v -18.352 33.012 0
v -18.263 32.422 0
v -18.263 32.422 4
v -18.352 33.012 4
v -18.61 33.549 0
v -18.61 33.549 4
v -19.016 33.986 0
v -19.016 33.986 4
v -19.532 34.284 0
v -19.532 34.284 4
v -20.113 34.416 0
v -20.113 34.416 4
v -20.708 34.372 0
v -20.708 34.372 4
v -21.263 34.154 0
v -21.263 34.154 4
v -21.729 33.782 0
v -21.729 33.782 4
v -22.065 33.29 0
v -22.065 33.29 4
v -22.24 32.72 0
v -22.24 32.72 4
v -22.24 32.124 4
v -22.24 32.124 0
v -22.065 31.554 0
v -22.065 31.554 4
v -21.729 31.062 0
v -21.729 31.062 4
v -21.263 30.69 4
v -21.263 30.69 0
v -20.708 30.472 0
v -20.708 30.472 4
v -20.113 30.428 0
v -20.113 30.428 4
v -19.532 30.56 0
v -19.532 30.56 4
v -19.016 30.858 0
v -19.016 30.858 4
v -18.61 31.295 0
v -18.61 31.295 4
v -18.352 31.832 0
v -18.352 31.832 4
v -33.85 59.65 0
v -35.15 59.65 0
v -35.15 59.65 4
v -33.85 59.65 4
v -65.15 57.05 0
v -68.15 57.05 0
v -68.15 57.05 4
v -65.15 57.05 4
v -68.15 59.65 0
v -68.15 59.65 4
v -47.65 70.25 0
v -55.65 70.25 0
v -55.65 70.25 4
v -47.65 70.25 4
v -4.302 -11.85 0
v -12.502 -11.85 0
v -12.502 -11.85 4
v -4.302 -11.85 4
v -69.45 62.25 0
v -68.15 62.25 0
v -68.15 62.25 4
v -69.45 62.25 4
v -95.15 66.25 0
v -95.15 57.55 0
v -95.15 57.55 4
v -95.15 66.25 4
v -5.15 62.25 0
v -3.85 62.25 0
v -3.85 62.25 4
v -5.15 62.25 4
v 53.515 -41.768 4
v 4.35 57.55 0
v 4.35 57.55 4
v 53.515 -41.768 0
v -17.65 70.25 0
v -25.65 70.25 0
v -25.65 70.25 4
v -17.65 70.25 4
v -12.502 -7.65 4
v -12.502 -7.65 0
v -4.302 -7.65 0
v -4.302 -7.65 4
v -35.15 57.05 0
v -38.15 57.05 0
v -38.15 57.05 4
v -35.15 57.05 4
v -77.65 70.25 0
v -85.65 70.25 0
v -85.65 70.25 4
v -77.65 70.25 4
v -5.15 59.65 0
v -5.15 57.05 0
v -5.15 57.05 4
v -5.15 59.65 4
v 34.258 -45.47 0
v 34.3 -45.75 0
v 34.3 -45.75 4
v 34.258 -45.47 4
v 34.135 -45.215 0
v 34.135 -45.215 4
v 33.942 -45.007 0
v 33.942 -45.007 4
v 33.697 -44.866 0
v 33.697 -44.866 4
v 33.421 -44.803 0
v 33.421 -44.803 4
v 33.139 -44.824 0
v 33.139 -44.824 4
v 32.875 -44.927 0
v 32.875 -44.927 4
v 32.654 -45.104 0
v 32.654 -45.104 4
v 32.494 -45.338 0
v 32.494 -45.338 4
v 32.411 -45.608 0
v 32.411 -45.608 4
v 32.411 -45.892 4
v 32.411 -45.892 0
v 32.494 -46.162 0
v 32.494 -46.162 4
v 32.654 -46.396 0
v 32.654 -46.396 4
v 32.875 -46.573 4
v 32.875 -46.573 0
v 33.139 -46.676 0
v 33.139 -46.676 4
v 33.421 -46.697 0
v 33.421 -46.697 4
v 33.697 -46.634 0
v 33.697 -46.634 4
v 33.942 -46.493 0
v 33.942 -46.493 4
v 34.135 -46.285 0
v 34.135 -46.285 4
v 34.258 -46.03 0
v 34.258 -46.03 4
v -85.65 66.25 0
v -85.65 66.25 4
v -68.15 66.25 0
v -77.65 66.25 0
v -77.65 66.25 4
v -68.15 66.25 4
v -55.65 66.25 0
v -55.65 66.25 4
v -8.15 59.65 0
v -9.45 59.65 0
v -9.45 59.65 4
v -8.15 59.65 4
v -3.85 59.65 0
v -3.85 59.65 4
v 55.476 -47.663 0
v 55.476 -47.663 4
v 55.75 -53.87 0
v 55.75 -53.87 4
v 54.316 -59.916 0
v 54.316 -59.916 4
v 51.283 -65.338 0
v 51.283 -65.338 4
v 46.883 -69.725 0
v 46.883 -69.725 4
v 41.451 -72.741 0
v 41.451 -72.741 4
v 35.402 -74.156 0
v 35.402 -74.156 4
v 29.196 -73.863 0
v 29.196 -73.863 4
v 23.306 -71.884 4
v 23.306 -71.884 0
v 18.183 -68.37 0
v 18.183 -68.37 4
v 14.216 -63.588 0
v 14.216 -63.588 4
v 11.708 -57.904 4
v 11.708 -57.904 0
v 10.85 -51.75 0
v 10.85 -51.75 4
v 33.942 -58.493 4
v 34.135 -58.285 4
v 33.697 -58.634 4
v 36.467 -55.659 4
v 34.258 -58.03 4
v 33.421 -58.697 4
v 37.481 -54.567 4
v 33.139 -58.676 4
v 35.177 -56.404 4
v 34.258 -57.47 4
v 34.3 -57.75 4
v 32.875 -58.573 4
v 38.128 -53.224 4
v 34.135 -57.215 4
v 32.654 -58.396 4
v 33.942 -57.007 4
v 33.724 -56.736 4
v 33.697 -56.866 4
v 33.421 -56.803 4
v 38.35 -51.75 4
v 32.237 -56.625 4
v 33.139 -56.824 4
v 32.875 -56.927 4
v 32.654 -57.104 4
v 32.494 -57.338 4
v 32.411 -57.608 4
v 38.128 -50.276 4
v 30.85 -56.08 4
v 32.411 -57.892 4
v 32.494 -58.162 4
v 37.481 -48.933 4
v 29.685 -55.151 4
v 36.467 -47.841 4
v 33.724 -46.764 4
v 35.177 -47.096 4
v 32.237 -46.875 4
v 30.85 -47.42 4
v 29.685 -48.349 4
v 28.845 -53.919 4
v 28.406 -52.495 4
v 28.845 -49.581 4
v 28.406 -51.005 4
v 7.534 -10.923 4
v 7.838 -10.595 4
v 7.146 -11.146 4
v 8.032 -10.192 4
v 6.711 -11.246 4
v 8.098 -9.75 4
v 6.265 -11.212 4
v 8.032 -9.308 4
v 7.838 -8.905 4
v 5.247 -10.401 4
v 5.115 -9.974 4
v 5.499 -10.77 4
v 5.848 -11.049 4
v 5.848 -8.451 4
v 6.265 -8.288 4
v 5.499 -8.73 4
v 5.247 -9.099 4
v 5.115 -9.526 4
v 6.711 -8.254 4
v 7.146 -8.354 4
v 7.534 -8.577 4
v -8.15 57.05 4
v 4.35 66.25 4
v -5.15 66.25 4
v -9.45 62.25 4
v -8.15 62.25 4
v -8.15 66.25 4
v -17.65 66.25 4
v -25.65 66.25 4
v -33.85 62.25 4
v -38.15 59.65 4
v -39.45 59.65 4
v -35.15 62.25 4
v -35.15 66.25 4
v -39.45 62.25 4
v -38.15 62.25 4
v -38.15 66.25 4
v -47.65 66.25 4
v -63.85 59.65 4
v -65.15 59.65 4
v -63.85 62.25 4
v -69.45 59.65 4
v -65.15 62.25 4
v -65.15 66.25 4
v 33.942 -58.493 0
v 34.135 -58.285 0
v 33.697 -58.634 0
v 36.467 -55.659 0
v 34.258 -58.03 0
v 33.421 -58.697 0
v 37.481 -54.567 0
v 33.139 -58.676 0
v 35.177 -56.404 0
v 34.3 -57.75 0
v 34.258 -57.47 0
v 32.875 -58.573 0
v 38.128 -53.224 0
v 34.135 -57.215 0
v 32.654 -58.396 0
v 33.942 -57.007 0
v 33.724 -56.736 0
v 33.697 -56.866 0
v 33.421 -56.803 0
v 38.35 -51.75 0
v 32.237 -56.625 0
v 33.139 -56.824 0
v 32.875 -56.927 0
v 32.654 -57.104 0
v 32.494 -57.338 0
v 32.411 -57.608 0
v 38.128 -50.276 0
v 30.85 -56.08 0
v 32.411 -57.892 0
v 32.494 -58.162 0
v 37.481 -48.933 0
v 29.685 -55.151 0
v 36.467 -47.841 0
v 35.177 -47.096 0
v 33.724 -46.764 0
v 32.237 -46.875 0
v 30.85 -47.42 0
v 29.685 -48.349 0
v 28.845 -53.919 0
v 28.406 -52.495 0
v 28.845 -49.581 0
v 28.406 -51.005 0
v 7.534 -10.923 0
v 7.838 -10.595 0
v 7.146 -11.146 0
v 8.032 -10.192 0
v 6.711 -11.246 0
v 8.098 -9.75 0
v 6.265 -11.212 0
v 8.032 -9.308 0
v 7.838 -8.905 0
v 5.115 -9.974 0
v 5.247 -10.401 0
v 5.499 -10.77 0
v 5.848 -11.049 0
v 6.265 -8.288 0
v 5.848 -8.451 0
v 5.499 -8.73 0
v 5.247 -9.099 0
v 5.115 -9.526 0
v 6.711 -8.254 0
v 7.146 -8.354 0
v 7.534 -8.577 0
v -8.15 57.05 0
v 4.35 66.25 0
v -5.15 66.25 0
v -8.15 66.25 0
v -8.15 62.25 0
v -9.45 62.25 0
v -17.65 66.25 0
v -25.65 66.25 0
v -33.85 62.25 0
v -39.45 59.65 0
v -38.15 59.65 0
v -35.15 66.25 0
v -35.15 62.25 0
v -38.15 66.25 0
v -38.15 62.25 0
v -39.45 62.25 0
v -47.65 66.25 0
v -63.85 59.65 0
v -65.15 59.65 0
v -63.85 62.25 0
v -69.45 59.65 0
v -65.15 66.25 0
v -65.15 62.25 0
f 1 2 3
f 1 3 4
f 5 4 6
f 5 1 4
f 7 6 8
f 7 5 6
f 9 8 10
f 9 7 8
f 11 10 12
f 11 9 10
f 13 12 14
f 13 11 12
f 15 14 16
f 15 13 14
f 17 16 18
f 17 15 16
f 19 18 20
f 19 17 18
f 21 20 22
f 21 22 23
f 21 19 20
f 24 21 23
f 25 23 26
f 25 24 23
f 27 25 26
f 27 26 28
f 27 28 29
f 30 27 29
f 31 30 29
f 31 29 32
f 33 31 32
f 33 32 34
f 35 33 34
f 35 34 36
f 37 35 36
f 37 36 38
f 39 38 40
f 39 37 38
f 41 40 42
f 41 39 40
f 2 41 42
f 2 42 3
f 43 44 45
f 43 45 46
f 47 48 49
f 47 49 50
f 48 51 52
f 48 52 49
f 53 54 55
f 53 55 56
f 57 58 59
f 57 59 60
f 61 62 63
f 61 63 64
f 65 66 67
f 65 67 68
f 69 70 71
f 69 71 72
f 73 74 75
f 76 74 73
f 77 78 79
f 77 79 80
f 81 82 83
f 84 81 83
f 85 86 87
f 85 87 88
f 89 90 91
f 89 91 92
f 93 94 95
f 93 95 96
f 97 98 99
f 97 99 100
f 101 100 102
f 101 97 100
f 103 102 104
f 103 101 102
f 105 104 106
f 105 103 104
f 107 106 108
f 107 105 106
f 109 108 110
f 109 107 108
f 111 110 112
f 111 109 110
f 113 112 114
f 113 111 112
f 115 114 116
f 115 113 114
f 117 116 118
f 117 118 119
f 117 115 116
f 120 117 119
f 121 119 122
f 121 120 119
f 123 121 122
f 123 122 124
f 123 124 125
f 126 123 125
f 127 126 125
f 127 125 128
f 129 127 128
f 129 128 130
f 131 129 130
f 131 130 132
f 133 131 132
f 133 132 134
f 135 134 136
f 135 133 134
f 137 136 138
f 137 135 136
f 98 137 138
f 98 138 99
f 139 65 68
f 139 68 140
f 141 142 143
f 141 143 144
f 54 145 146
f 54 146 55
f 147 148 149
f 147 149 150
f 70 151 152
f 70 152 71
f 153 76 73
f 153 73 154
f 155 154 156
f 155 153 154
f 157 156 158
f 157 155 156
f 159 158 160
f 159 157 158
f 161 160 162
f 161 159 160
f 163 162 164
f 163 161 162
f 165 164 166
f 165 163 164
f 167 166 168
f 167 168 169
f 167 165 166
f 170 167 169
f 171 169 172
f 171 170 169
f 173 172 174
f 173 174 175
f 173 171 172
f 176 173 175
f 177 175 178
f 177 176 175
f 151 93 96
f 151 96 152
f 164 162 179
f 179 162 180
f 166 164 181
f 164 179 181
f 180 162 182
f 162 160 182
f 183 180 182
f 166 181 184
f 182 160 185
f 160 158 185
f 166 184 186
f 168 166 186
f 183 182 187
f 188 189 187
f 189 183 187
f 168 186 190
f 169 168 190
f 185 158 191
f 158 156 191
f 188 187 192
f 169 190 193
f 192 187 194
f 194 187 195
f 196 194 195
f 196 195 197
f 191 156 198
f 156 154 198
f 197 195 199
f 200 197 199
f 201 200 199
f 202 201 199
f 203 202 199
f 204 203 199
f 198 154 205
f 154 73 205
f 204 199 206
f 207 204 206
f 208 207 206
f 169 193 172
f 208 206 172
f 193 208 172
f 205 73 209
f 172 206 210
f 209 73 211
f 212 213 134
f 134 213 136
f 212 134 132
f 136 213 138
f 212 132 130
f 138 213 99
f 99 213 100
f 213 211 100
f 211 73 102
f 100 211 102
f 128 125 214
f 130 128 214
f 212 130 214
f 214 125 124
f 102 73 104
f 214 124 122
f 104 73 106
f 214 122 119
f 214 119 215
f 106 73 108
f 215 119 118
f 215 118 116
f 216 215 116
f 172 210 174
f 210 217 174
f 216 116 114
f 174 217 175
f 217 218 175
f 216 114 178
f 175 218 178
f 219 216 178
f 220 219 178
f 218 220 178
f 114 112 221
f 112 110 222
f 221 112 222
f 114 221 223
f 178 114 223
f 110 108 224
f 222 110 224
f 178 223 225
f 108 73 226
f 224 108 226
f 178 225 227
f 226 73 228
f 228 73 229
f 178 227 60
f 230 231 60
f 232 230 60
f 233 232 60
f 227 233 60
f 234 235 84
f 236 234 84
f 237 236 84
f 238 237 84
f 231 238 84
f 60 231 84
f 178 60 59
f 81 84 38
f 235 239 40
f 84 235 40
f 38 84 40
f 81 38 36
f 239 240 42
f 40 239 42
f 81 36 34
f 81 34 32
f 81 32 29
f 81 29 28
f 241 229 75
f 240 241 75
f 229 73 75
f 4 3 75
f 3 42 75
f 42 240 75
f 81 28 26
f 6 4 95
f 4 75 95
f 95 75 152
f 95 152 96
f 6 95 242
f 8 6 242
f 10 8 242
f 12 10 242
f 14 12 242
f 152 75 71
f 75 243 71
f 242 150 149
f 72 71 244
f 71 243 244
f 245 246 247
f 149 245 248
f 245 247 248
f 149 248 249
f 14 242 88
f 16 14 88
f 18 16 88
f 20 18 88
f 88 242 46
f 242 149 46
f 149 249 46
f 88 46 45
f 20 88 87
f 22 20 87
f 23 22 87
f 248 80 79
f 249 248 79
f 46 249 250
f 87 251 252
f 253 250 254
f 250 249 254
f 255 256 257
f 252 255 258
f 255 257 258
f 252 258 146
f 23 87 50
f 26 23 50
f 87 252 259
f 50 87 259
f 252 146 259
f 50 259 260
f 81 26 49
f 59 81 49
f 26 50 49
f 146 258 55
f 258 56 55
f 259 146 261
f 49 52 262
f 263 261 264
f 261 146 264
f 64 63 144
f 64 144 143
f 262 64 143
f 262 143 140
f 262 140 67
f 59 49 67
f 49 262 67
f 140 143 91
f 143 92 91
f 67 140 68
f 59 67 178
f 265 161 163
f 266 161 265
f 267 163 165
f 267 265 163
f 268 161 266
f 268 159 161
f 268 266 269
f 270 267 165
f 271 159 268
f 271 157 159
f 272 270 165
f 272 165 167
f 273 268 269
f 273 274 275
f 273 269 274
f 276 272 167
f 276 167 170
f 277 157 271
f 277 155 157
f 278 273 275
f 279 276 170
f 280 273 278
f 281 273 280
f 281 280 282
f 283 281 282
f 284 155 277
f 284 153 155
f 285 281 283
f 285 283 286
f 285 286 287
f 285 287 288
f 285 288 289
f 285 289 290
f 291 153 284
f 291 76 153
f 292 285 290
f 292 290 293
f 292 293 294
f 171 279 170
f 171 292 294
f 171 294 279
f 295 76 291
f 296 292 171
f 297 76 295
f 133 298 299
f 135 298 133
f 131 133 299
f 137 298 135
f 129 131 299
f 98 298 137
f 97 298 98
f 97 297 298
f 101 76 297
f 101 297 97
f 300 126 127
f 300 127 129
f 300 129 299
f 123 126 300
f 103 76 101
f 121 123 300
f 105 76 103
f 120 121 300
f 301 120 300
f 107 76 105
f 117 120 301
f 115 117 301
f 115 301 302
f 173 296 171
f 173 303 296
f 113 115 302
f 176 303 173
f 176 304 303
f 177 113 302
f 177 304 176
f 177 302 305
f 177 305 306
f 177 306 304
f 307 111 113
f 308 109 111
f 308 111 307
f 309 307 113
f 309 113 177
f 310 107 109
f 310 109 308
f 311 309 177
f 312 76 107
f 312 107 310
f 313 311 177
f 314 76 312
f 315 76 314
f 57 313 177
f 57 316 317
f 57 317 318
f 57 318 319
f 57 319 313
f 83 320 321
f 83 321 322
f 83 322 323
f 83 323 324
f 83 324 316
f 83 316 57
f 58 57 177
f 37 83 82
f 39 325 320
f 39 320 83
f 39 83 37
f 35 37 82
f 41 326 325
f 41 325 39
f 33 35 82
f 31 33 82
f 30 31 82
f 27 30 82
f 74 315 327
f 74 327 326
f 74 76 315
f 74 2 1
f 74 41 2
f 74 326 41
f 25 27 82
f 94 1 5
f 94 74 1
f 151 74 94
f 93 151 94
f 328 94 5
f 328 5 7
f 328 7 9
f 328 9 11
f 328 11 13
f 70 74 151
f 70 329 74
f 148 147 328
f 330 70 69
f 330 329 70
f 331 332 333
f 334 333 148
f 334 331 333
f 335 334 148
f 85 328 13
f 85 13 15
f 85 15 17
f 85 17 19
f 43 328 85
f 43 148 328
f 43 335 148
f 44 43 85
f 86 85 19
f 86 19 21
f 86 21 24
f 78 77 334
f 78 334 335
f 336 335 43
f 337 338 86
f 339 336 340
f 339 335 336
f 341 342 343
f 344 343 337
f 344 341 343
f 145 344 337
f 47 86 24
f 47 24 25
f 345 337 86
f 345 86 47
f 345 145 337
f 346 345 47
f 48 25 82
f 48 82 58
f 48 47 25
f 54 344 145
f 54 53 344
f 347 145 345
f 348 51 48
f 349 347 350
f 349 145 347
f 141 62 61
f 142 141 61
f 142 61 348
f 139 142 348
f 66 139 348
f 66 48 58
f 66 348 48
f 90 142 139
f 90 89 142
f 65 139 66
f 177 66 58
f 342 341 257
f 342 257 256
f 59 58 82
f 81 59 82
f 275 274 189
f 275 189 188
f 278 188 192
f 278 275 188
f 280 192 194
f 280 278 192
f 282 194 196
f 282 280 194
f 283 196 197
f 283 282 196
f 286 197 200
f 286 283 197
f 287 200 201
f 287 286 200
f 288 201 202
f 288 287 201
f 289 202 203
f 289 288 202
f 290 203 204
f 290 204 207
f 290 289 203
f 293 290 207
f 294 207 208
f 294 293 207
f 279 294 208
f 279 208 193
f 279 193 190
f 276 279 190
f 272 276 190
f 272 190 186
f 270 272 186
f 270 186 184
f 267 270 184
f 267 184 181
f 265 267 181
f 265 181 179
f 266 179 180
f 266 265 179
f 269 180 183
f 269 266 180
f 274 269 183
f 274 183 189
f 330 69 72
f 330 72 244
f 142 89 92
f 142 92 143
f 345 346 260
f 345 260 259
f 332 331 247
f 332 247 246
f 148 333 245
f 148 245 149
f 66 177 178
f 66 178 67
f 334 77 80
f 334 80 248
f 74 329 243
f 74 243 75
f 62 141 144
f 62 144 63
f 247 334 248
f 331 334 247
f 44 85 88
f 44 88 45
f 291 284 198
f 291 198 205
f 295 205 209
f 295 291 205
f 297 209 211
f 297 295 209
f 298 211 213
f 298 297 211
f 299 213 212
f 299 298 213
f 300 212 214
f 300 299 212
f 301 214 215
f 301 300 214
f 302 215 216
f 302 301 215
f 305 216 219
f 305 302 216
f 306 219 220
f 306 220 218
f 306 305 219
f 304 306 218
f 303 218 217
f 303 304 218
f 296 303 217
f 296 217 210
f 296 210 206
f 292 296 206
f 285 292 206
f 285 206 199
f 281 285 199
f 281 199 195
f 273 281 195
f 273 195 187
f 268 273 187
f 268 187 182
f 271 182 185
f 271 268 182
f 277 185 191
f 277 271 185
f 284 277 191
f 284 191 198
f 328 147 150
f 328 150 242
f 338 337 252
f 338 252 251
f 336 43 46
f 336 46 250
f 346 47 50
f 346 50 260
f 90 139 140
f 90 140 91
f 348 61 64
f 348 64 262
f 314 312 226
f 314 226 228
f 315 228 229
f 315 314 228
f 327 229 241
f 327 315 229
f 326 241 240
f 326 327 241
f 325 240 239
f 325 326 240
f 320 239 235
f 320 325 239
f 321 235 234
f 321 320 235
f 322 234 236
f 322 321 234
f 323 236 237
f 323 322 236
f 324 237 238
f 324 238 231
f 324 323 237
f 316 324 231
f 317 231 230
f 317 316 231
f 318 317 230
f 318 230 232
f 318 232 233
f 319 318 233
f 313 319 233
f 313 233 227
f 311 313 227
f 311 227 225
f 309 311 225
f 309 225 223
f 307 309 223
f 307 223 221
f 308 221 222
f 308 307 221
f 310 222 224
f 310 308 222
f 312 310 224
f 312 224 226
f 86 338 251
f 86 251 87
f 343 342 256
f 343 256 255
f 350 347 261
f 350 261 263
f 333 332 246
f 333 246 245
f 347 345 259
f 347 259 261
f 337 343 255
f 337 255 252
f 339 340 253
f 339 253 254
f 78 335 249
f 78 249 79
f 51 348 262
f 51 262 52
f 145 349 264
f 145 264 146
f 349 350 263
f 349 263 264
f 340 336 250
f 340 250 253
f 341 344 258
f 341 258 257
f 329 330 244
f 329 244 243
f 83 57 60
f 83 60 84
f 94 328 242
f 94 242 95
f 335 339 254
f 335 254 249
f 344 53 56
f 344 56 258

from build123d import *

# Parameters (mm, degrees)
SKETCH_1_R      = 2
SKETCH_1_R_2    = 1.5
SKETCH_1_R_3    = 5
SKETCH_1_R_4    = 0.95
SKETCH_1_W      = 8.2
SKETCH_1_H      = 4.2
EXTRUDE_1_DEPTH = 4


with BuildPart() as part:
    # 草图1 → 凸台-拉伸1 (new body)
    with BuildSketch(Plane.XY):
        with BuildLine():
            Line((-38.15, 66.25), (-38.15, 62.25))
            Line((-38.15, 62.25), (-39.45, 62.25))
            Line((-39.45, 62.25), (-39.45, 59.65))
            Line((-39.45, 59.65), (-38.15, 59.65))
            Line((-38.15, 59.65), (-38.15, 57.05))
            Line((-38.15, 57.05), (-35.15, 57.05))
            Line((-35.15, 57.05), (-35.15, 59.65))
            Line((-35.15, 59.65), (-33.85, 59.65))
            Line((-33.85, 59.65), (-33.85, 62.25))
            Line((-33.85, 62.25), (-35.15, 62.25))
            Line((-35.15, 62.25), (-35.15, 66.25))
            Line((-35.15, 66.25), (-25.65, 66.25))
            Line((-25.65, 66.25), (-25.65, 70.25))
            Line((-25.65, 70.25), (-17.65, 70.25))
            Line((-17.65, 70.25), (-17.65, 66.25))
            Line((-17.65, 66.25), (-8.15, 66.25))
            Line((-8.15, 66.25), (-8.15, 62.25))
            Line((-8.15, 62.25), (-9.45, 62.25))
            Line((-9.45, 62.25), (-9.45, 59.65))
            Line((-9.45, 59.65), (-8.15, 59.65))
            Line((-8.15, 59.65), (-8.15, 57.05))
            Line((-8.15, 57.05), (-5.15, 57.05))
            Line((-5.15, 57.05), (-5.15, 59.65))
            Line((-5.15, 59.65), (-3.85, 59.65))
            Line((-3.85, 59.65), (-3.85, 62.25))
            Line((-3.85, 62.25), (-5.15, 62.25))
            Line((-5.15, 62.25), (-5.15, 66.25))
            Line((-5.15, 66.25), (4.35, 66.25))
            Line((4.35, 66.25), (4.35, 57.55))
            Line((4.35, 57.55), (53.51460577, -41.768082641))
            ThreePointArc((53.51460577, -41.768082641), (38.475737517, -73.658373169), (10.85, -51.75))
            Line((10.85, -51.75), (-95.15, 57.55))
            Line((-95.15, 57.55), (-95.15, 66.25))
            Line((-95.15, 66.25), (-85.65, 66.25))
            Line((-85.65, 66.25), (-85.65, 70.25))
            Line((-85.65, 70.25), (-77.65, 70.25))
            Line((-77.65, 70.25), (-77.65, 66.25))
            Line((-77.65, 66.25), (-68.15, 66.25))
            Line((-68.15, 66.25), (-68.15, 62.25))
            Line((-68.15, 62.25), (-69.45, 62.25))
            Line((-69.45, 62.25), (-69.45, 59.65))
            Line((-69.45, 59.65), (-68.15, 59.65))
            Line((-68.15, 59.65), (-68.15, 57.05))
            Line((-68.15, 57.05), (-65.15, 57.05))
            Line((-65.15, 57.05), (-65.15, 59.65))
            Line((-65.15, 59.65), (-63.85, 59.65))
            Line((-63.85, 59.65), (-63.85, 62.25))
            Line((-63.85, 62.25), (-65.15, 62.25))
            Line((-65.15, 62.25), (-65.15, 66.25))
            Line((-65.15, 66.25), (-55.65, 66.25))
            Line((-55.65, 66.25), (-55.65, 70.25))
            Line((-55.65, 70.25), (-47.65, 70.25))
            Line((-47.65, 70.25), (-47.65, 66.25))
            Line((-47.65, 66.25), (-38.15, 66.25))
        make_face()
        with Locations((-20.262745434, 32.422010331)):
            Circle(SKETCH_1_R, mode=Mode.SUBTRACT)
        with Locations((6.598407643, -9.75)):
            Circle(SKETCH_1_R_2, mode=Mode.SUBTRACT)
        with Locations((33.35, -51.75)):
            Circle(SKETCH_1_R_3, mode=Mode.SUBTRACT)
        with Locations((33.35, -45.75)):
            Circle(SKETCH_1_R_4, mode=Mode.SUBTRACT)
        with Locations((33.35, -57.75)):
            Circle(SKETCH_1_R_4, mode=Mode.SUBTRACT)
        with Locations((-8.401592357, -9.75)):
            Rectangle(SKETCH_1_W, SKETCH_1_H, mode=Mode.SUBTRACT)
    extrude(amount=EXTRUDE_1_DEPTH)


solid = part.part
